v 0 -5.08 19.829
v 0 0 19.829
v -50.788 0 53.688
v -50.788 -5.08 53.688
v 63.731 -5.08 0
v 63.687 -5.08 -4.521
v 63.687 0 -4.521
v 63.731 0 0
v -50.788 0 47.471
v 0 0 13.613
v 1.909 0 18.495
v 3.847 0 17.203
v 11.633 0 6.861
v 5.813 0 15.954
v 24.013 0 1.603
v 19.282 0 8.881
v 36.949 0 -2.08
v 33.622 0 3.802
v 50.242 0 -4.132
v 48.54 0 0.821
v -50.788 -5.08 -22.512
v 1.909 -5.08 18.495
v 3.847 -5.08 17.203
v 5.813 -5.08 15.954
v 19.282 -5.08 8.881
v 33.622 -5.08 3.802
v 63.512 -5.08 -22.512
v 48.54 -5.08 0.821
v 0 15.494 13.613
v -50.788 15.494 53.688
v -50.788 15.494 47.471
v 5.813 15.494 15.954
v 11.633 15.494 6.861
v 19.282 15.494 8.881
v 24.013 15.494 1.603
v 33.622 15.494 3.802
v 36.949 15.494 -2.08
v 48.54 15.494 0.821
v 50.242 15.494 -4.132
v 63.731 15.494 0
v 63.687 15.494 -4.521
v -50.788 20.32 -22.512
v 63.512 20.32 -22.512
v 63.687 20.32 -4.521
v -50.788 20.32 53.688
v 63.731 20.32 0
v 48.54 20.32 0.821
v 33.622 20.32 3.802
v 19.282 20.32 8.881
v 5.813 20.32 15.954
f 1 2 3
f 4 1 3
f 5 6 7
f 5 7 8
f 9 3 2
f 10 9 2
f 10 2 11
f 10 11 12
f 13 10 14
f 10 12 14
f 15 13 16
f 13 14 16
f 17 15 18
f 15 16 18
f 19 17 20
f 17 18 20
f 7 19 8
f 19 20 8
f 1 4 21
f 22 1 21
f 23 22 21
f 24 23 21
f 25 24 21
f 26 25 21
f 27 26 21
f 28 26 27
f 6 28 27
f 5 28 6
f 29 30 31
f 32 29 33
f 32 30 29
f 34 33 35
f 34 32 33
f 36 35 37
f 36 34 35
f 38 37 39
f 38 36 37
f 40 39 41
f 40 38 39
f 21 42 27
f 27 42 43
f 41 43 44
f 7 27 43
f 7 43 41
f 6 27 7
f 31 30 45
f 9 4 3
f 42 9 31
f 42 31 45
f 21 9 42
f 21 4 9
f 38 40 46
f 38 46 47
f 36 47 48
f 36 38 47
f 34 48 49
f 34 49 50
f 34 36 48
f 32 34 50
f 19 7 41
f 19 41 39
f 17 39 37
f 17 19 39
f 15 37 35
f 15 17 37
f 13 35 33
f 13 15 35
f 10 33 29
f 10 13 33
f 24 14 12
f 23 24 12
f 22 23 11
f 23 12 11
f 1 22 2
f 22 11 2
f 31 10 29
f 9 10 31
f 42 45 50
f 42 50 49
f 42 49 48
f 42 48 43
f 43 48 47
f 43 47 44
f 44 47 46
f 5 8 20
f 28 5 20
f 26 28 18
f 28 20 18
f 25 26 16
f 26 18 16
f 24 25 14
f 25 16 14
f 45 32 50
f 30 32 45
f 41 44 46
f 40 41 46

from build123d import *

# Parameters (mm, degrees)
F1_DEPTH      = 5.08
F2_START      = -15.494
F2_DEPTH      = 4.826
F3_DEPTH      = 15.748
F3_DEPTH_BACK = 1.016


with BuildPart() as f1:
    # F0 (on Front) → F1 (new body)
    with BuildSketch(Plane.XZ):
        with BuildLine():
            Line((-50.7880747318, 53.6880129844), (-50.7880747318, 47.4713742733))
            Line((-50.7880747318, 47.4713742733), (0, 13.6126577854))
            ThreePointArc((0, 13.6126577854), (30.4237649591, -0.4397436147), (63.6866472612, -4.5209346608))
            Line((63.6866472612, -4.5209346608), (63.7305527925, 0))
            ThreePointArc((63.7305527925, 0), (33.6220207616, 3.8020605731), (5.8134317271, 15.9536753451))
            ThreePointArc((5.8134317271, 15.9536753451), (2.8748778359, 17.8437288794), (0, 19.8292964965))
            Line((0, 19.8292964965), (-50.7880747318, 53.6880129844))
        make_face()
        with BuildLine():
            Line((-50.7880747318, 47.4713742733), (-50.7880747318, -22.5119870156))
            Line((-50.7880747318, -22.5119870156), (63.5119252682, -22.5119870156))
            Line((63.5119252682, -22.5119870156), (63.6866472612, -4.5209346608))
            ThreePointArc((63.6866472612, -4.5209346608), (30.4237649591, -0.4397436147), (0, 13.6126577854))
            Line((0, 13.6126577854), (-50.7880747318, 47.4713742733))
        make_face()
    extrude(amount=F1_DEPTH)



with BuildPart() as f2:
    # F0 (on Front) → F2 (new body)
    with BuildSketch(Plane.XZ.offset(F2_START)):
        with BuildLine():
            Line((-50.7880747318, 47.4713742733), (-50.7880747318, -22.5119870156))
            Line((-50.7880747318, -22.5119870156), (63.5119252682, -22.5119870156))
            Line((63.5119252682, -22.5119870156), (63.6866472612, -4.5209346608))
            ThreePointArc((63.6866472612, -4.5209346608), (30.4237649591, -0.4397436147), (0, 13.6126577854))
            Line((0, 13.6126577854), (-50.7880747318, 47.4713742733))
        make_face()
        with BuildLine():
            Line((-50.7880747318, 53.6880129844), (-50.7880747318, 47.4713742733))
            Line((-50.7880747318, 47.4713742733), (0, 13.6126577854))
            ThreePointArc((0, 13.6126577854), (30.4237649591, -0.4397436147), (63.6866472612, -4.5209346608))
            Line((63.6866472612, -4.5209346608), (63.7305527925, 0))
            ThreePointArc((63.7305527925, 0), (33.6220207616, 3.8020605731), (5.8134317271, 15.9536753451))
            ThreePointArc((5.8134317271, 15.9536753451), (2.8748778359, 17.8437288794), (0, 19.8292964965))
            Line((0, 19.8292964965), (-50.7880747318, 53.6880129844))
        make_face()
        with BuildLine():
            Line((5.8134317271, 15.9536753451), (0, 19.8292964965))
            ThreePointArc((0, 19.8292964965), (2.8748778359, 17.8437288794), (5.8134317271, 15.9536753451))
        make_face()
    extrude(amount=-F2_DEPTH)


with BuildPart() as f1_1:
    add(f1.part)

    add(f2.part)  # F3 merges F2
    # F0 (on Front) → F3 (join, two sides)
    with BuildSketch(Plane.XZ) as f3_sk:
        with BuildLine():
            Line((-50.7880747318, 47.4713742733), (-50.7880747318, -22.5119870156))
            Line((-50.7880747318, -22.5119870156), (63.5119252682, -22.5119870156))
            Line((63.5119252682, -22.5119870156), (63.6866472612, -4.5209346608))
            ThreePointArc((63.6866472612, -4.5209346608), (30.4237649591, -0.4397436147), (0, 13.6126577854))
            Line((0, 13.6126577854), (-50.7880747318, 47.4713742733))
        make_face()
    extrude(amount=-F3_DEPTH)
    extrude(f3_sk.sketch, amount=F3_DEPTH_BACK)


solid = f1_1.part
